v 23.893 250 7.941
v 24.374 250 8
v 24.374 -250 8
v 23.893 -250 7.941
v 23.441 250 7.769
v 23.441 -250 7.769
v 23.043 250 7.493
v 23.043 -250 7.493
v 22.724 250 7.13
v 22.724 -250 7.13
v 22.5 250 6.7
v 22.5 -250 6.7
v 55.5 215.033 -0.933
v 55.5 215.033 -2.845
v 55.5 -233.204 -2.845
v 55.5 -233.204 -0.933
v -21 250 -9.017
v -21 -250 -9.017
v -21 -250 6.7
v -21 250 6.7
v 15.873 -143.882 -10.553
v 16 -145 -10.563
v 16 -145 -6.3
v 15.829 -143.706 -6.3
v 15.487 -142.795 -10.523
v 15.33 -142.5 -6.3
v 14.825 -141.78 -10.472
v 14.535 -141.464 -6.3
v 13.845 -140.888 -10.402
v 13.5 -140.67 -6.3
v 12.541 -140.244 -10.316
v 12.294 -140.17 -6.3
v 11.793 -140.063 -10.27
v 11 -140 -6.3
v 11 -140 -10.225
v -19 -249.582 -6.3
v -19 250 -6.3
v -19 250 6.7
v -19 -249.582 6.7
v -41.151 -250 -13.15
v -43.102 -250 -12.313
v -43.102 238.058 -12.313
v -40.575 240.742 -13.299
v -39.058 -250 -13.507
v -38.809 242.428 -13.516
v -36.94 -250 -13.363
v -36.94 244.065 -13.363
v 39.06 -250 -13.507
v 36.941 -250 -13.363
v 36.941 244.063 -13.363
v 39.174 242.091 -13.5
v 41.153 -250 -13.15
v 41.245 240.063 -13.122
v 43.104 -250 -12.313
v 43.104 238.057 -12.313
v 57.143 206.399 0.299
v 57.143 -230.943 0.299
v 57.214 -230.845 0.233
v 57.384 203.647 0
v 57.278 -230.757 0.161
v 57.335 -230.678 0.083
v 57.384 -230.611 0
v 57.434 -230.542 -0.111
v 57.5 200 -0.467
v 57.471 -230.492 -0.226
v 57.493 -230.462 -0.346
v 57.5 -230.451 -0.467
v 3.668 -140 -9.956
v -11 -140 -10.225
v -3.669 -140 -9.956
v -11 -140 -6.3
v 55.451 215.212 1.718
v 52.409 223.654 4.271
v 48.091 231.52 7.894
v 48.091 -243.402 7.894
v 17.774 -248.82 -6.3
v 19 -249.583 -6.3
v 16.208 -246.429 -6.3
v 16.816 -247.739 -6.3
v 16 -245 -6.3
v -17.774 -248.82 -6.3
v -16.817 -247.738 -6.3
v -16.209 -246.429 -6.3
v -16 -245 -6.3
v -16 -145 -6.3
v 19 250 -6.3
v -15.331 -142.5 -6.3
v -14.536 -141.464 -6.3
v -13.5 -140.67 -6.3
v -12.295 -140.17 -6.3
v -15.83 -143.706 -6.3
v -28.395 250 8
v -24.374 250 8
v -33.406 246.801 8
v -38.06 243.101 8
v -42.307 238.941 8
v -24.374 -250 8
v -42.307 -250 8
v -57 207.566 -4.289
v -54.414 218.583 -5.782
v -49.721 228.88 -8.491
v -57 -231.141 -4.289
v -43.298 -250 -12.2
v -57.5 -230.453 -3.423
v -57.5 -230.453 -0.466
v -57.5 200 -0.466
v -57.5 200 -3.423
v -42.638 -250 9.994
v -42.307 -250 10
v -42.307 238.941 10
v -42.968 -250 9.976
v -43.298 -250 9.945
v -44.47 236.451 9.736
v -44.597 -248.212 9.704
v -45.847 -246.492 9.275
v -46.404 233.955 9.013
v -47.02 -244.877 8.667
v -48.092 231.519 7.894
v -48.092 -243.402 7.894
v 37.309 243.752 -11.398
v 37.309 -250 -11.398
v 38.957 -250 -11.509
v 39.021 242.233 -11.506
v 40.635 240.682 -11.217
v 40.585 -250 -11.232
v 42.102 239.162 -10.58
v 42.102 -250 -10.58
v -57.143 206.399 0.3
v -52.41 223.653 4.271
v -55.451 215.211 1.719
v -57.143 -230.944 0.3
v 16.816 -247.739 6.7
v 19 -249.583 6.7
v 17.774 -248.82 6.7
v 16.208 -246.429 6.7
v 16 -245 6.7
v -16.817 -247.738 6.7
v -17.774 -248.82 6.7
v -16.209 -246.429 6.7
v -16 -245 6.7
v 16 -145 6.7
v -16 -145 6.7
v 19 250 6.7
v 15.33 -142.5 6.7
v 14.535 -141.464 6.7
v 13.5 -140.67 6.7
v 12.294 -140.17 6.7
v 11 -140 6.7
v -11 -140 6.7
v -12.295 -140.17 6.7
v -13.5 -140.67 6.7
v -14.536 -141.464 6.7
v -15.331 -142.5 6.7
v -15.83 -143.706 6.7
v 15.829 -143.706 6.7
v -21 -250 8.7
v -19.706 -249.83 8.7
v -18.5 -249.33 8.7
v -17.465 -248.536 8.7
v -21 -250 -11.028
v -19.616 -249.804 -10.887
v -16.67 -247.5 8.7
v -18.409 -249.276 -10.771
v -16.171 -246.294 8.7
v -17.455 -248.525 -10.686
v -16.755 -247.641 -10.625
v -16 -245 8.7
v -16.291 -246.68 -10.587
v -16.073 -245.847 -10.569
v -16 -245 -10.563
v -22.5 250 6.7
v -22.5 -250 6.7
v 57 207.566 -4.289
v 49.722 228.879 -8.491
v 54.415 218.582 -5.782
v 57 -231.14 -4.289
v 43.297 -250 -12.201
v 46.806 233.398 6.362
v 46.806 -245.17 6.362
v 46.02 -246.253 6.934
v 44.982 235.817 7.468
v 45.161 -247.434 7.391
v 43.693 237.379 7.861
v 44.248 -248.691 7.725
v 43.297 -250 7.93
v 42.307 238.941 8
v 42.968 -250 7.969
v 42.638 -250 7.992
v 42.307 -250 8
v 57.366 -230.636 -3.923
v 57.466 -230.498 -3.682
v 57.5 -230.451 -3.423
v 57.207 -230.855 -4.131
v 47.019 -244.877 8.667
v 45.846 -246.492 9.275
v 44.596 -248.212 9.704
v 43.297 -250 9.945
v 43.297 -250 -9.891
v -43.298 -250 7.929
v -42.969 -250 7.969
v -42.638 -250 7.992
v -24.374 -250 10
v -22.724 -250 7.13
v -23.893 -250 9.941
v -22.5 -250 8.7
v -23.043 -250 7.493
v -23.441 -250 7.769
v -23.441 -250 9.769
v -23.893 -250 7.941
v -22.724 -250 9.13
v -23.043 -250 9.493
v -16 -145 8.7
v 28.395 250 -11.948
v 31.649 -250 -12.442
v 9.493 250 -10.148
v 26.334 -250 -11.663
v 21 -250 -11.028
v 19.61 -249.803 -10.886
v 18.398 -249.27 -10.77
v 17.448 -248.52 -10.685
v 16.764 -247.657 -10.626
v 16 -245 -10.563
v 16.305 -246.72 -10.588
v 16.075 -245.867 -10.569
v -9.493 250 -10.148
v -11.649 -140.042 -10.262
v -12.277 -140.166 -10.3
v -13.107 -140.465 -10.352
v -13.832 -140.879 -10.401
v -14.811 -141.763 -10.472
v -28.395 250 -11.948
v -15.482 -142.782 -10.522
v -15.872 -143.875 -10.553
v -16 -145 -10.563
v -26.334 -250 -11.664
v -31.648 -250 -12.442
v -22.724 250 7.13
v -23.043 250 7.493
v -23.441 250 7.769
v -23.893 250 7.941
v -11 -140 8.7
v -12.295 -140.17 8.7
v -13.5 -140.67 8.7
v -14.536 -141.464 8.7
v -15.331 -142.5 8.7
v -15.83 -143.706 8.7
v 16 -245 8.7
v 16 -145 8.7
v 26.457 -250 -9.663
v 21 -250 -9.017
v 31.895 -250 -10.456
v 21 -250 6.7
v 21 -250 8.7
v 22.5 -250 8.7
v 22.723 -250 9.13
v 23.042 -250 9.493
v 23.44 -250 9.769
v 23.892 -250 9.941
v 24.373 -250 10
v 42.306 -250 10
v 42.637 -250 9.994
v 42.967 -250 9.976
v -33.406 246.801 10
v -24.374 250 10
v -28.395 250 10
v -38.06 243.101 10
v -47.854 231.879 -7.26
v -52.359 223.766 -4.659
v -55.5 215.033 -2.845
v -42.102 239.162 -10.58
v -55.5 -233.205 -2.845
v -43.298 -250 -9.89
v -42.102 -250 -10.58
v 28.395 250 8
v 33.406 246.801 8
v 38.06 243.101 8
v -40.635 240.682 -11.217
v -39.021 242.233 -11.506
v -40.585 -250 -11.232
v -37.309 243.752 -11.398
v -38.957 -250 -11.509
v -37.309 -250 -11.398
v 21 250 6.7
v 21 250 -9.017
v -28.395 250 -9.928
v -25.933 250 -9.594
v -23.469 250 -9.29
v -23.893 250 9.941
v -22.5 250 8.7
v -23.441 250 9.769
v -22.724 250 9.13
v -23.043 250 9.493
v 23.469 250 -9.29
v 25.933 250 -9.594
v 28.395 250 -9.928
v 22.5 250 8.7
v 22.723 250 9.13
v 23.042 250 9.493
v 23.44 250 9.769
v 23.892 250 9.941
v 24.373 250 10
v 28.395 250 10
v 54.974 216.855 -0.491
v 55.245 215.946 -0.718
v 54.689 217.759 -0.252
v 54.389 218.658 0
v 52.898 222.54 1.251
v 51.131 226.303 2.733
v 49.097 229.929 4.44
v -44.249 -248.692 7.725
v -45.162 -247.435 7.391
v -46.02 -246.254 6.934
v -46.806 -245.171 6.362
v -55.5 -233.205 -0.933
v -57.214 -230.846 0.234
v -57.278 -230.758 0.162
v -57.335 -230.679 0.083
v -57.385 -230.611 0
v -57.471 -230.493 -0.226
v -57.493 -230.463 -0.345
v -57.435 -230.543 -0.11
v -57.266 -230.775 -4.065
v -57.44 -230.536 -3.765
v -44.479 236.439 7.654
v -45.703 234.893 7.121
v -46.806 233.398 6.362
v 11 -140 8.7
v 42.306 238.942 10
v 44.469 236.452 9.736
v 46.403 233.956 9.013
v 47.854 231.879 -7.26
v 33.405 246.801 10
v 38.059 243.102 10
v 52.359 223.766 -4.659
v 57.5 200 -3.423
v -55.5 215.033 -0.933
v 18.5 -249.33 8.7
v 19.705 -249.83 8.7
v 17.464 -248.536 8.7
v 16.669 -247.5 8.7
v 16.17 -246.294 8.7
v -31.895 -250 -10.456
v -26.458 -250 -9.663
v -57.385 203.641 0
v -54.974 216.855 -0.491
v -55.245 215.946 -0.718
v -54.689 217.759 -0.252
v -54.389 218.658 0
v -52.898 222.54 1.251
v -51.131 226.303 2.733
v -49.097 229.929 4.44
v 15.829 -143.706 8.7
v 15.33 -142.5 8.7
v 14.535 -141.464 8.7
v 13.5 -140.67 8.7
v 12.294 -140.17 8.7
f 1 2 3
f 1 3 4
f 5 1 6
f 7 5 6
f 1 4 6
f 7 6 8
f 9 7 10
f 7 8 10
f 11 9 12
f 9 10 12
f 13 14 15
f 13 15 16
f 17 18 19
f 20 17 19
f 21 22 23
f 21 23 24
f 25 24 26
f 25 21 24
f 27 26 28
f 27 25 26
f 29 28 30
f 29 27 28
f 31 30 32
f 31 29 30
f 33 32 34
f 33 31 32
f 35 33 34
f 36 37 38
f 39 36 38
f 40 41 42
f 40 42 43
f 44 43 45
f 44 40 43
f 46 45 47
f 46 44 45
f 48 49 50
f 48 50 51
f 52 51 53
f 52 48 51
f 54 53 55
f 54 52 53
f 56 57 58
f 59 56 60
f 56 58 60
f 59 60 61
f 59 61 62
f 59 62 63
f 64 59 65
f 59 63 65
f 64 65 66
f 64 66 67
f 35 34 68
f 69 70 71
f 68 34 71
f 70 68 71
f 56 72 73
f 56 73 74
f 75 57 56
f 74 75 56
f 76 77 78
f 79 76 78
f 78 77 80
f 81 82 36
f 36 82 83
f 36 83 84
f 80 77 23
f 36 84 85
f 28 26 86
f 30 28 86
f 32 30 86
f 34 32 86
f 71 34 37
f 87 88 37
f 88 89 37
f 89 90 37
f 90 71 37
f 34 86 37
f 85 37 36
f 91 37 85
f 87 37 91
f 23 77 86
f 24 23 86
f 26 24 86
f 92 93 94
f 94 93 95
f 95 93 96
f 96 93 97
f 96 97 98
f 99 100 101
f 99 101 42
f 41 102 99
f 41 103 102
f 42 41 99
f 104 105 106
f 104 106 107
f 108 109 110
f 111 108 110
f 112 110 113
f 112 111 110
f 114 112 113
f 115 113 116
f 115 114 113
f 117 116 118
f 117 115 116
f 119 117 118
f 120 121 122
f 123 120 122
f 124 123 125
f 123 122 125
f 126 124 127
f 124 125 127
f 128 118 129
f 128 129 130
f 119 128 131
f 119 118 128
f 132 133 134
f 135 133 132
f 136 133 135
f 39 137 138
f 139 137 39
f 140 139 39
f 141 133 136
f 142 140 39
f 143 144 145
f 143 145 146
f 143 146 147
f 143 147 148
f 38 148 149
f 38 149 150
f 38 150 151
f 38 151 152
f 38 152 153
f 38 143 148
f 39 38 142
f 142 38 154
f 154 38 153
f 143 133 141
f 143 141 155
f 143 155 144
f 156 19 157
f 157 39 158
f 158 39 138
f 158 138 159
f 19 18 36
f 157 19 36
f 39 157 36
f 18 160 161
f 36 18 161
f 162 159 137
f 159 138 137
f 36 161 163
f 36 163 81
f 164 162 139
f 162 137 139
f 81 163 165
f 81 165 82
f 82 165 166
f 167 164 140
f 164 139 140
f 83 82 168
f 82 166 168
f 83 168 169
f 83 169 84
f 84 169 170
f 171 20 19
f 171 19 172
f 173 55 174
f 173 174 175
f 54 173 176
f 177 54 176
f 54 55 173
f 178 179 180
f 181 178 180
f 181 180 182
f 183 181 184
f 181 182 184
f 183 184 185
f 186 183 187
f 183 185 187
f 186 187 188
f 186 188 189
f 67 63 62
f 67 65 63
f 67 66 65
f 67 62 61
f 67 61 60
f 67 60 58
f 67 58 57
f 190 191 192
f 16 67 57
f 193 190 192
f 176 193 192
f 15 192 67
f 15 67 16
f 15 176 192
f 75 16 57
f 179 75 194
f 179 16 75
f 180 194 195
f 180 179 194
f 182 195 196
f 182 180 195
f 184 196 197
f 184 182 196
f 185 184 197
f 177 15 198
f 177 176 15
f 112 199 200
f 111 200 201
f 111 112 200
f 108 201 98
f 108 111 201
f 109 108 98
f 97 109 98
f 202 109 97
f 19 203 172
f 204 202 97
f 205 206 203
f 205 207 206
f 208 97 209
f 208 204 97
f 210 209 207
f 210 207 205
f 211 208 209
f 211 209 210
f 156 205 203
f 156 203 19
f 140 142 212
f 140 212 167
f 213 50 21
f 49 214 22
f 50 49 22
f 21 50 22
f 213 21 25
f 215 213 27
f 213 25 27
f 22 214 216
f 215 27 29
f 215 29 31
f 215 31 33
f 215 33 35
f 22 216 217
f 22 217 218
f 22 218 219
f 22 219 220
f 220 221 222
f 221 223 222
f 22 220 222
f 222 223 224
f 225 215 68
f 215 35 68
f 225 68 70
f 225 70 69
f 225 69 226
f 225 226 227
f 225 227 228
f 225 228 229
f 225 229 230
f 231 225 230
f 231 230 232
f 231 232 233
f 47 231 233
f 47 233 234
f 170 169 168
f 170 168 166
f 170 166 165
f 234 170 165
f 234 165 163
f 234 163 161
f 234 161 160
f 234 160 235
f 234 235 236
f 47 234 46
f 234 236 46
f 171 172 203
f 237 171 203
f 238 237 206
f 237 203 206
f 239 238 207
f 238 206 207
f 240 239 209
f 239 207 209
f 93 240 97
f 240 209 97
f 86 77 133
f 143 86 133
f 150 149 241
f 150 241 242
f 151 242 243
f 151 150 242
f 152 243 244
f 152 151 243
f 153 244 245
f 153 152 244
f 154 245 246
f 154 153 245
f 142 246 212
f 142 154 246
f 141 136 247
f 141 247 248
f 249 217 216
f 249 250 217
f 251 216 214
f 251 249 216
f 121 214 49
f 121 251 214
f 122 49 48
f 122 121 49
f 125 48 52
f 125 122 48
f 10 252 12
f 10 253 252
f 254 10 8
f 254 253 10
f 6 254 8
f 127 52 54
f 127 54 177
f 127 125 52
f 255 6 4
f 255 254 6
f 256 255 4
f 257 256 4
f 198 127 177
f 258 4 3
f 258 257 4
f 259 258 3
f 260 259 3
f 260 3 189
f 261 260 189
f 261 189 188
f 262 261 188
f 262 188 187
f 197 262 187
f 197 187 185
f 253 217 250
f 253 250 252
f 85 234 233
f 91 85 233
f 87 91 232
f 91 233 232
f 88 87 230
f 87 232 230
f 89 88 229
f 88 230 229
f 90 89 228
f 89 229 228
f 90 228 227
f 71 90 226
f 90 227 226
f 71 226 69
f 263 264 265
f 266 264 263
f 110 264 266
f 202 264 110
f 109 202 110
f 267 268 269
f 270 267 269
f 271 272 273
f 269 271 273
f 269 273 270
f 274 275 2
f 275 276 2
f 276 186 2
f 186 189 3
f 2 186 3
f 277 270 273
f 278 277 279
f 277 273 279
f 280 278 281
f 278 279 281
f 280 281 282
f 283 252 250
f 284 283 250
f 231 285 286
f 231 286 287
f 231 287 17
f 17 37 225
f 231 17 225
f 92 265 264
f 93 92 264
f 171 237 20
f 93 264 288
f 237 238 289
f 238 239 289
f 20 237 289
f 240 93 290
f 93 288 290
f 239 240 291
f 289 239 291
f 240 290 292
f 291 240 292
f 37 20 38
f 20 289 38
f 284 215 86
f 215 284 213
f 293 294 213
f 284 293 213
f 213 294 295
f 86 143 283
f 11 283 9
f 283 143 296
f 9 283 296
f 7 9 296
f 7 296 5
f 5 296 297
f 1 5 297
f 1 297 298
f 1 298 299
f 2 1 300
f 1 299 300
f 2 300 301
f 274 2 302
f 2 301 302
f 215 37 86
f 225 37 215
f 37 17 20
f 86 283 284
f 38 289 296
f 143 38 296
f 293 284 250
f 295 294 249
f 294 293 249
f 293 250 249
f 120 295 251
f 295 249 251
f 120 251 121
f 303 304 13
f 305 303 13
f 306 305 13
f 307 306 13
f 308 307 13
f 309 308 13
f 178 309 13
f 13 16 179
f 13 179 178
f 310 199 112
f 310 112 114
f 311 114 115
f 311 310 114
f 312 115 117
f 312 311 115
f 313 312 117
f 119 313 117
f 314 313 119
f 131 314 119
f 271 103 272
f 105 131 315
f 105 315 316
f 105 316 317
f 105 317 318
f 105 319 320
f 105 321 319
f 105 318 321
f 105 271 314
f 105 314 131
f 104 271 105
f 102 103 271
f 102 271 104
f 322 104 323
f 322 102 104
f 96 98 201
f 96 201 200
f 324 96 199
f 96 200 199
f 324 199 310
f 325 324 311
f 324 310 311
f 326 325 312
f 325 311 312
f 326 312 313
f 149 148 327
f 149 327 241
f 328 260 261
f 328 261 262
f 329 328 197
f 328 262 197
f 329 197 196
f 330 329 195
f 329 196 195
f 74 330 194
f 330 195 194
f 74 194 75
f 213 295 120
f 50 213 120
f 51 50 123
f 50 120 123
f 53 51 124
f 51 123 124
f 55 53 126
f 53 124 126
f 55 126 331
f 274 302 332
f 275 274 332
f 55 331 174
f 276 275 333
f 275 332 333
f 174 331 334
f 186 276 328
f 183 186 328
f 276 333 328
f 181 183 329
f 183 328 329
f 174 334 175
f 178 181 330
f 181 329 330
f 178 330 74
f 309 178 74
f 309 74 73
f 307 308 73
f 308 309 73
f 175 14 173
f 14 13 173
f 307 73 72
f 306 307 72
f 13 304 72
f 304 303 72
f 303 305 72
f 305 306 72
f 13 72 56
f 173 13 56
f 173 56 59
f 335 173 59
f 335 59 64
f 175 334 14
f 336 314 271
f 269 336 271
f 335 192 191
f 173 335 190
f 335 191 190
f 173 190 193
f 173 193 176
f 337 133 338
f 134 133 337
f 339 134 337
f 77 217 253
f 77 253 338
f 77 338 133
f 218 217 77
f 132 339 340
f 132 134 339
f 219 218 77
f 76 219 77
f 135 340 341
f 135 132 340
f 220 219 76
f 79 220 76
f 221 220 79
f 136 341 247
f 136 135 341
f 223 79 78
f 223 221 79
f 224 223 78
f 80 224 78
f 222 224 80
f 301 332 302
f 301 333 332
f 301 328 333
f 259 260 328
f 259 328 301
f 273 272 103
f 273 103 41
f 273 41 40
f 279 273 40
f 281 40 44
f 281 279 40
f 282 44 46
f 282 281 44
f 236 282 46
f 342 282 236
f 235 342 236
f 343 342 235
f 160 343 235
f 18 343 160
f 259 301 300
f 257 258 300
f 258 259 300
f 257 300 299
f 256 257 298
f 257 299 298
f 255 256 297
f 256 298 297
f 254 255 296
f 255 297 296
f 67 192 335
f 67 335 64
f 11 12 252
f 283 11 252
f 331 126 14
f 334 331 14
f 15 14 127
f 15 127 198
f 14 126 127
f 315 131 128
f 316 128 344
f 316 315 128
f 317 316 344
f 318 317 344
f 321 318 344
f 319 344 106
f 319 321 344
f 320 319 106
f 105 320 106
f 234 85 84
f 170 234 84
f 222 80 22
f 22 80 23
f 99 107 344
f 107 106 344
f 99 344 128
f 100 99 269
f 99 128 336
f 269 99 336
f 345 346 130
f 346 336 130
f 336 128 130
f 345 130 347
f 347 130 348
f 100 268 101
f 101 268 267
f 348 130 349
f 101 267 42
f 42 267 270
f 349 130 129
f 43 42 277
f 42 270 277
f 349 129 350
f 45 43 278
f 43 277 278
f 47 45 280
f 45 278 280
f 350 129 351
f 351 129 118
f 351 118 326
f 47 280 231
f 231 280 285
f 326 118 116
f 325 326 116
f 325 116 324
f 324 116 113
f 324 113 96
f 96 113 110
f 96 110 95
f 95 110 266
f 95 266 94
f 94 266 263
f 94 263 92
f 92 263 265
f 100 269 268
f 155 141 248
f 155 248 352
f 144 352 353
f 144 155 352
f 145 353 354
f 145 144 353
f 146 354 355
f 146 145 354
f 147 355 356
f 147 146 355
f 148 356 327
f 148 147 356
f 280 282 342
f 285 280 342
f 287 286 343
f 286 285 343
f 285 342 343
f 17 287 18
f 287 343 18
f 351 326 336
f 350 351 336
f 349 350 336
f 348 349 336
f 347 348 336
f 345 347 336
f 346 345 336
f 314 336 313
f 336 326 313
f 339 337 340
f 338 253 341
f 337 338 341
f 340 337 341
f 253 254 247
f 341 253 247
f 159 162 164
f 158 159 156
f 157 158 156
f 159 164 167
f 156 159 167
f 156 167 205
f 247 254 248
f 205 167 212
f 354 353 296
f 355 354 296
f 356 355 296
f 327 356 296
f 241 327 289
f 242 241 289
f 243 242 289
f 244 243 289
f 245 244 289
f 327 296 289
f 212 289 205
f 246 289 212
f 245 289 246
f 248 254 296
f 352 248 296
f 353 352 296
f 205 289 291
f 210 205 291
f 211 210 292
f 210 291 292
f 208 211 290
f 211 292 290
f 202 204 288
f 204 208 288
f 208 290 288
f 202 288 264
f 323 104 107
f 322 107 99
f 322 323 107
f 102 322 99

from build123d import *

# Parameters (mm, degrees)
F2_DEPTH       = 250
F3_W           = 38
F3_H           = 13
F4_DEPTH       = 250
F5_R           = 9
F6_R           = 1
F7_T1_DEPTH    = 509.3674969976
F9_DEPTH       = 500.001
F12_DEPTH      = 13.5192964571
F12_DEPTH_BACK = 10.001
F13_T1_DEPTH   = 2
F13_T6_DEPTH   = 16.7634354909
F13_S7_R       = 200
F13_T8_DEPTH   = 11
F13_T12_DEPTH  = 16.7632527384
F13_S13_R      = 200
F13_T14_DEPTH  = 11
F13_T15_DEPTH  = 29.2634354909
F13_T17_DEPTH  = 27
F13_T19_DEPTH  = 29.2632527384
F14_DEPTH      = 13.5192964571
F14_DEPTH_BACK = 10.001


# Not quite as in the source:
# - a fillet or chamfer that OpenCascade refuses, or shapes differently, is made with other operations: its cross-section is extruded or revolved along the edge and cut away or added


with BuildPart() as f2:
    # F0 (on Front) → F2 (new body, symmetric)
    with BuildSketch(Plane.XZ):
        with BuildLine():
            Line((-22.5004640741, 10), (-45.5824640741, 10))
            Line((-45.5824640741, 10), (-57.5, 0))
            Line((-57.5, 0), (-57.5, -4))
            Line((-57.5, -4), (-40.1794919243, -14))
            ThreePointArc((-40.1794919243, -14), (0.0006744682, -9.9223168214), (40.1808408606, -14))
            Line((40.1808408606, -14), (57.5, -4.0007788087))
            Line((57.5, -4.0007788087), (57.5, -0.0007788087))
            Line((57.5, -0.0007788087), (45.5815359259, 10))
            Line((45.5815359259, 10), (22.4995359259, 10))
            Line((22.4995359259, 10), (22.4995359259, 8.7))
            Line((22.4995359259, 8.7), (-22.5004640741, 8.7))
            Line((-22.5004640741, 8.7), (-22.5004640741, 10))
        make_face()
    extrude(amount=F2_DEPTH, both=True)

    # F3 (on Front) → F4 (cut, symmetric)
    with BuildSketch(Plane.XZ):
        with Locations((0, 0.2)):
            Rectangle(F3_W, F3_H)
    extrude(amount=F4_DEPTH, both=True, mode=Mode.SUBTRACT)

    # F5
    f5_edges = [f2.edges().sort_by_distance(p)[0] for p in [
        (45.581536, 0, 10),
        (40.180841, 0, -14),
        (-45.582464, 0, 10),
        (-40.179492, 0, -14),
    ]]
    fillet(f5_edges, radius=F5_R)

    # F6
    f6_edges = [f2.edges().sort_by_distance(p)[0] for p in [
        (57.5, 0, -0.000779),
        (57.5, 0, -4.000779),
        (-57.5, 0, 0),
        (-57.5, 0, -4),
    ]]
    fillet(f6_edges, radius=F6_R)

    # F7: fillet of radius 2 on 2 edges, made by hand

    # F7_s2 → F7_t1 (cut)
    with BuildSketch(Plane.XZ.offset(-254.6837484988)):
        with BuildLine():
            ThreePointArc((24.3730353255, 10), (23.2328599004, 9.6431676725), (22.4995359259, 8.7))
            Line((22.4995359259, 8.7), (22.4995359259, 10))
            Line((22.4995359259, 10), (24.3730353255, 10))
        make_face()
        with BuildLine():
            ThreePointArc((-22.5004640741, 8.7), (-23.2337880485, 9.6431676725), (-24.3739634736, 10))
            Line((-24.3739634736, 10), (-22.5004640741, 10))
            Line((-22.5004640741, 10), (-22.5004640741, 8.7))
        make_face()
    extrude(amount=F7_T1_DEPTH, mode=Mode.SUBTRACT)

    # F8 (on face) → F9 (cut, through all)
    with BuildSketch(Plane.XZ.offset(250)):
        with BuildLine():
            Line((-21, -9.0169369236), (-21, 6.6999997944))
            Line((-21, 6.6999997944), (-22.5004640741, 6.6999997944))
            ThreePointArc((-22.5004640741, 6.6999997944), (-23.2337879899, 7.6431676078), (-24.3739634736, 8))
            Line((-24.3739634736, 8), (-42.3067319657, 8))
            ThreePointArc((-42.3067319657, 8), (-44.7008729689, 7.5778483455), (-46.8062452335, 6.3623111018))
            Line((-46.8062452335, 6.3623111018), (-55.5, -0.9326153163))
            Line((-55.5, -0.9326153163), (-55.5, -2.8452994616))
            Line((-55.5, -2.8452994616), (-42.102284203, -10.5804742836))
            ThreePointArc((-42.102284203, -10.5804742836), (-39.7790708711, -11.4186713119), (-37.3093621422, -11.3978569477))
            ThreePointArc((-37.3093621422, -11.3978569477), (-29.178975147, -10.0409819041), (-21, -9.0169369236))
        make_face()
        with BuildLine():
            Line((22.5004640741, 6.6999997944), (21, 6.6999997944))
            Line((21, 6.6999997944), (21, -9.0169369236))
            ThreePointArc((21, -9.0169369236), (29.178975147, -10.0409819041), (37.3093621422, -11.3978569477))
            ThreePointArc((37.3093621422, -11.3978569477), (39.7790708711, -11.4186713119), (42.102284203, -10.5804742836))
            Line((42.102284203, -10.5804742836), (55.5, -2.8452994616))
            Line((55.5, -2.8452994616), (55.5, -0.9326153163))
            Line((55.5, -0.9326153163), (46.8062452335, 6.3623111018))
            ThreePointArc((46.8062452335, 6.3623111018), (44.7008729689, 7.5778483455), (42.3067319657, 8))
            Line((42.3067319657, 8), (24.3739634736, 8))
            ThreePointArc((24.3739634736, 8), (23.2337879899, 7.6431676078), (22.5004640741, 6.6999997944))
        make_face()
    extrude(amount=-F9_DEPTH, mode=Mode.SUBTRACT)

    # F11 (on Top) → F12 (cut, two sides)
    with BuildSketch(Plane.XY) as f12_sk:
        Polygon((-68.0004640741, -346), (67.9995359259, -346), (67.9995359259, -216), (43.2970899738, -250), (15.9995359259, -250), (15.9995359259, -140), (-16.0004640741, -140), (-16.0004640741, -250), (-43.2980181219, -250), (-68.0004640741, -216), align=None)
    extrude(amount=-F12_DEPTH, mode=Mode.SUBTRACT)
    extrude(f12_sk.sketch, amount=F12_DEPTH_BACK, mode=Mode.SUBTRACT)

    # F13: fillet of radius 5 on 8 edges, made by hand

    # F13_s2 → F13_t1 (join)
    with BuildSketch(Plane.XY.offset(6.7)):
        with BuildLine():
            ThreePointArc((-11.0004640741, -140), (-14.53599798, -141.4644660941), (-16.0004640741, -145))
            Line((-16.0004640741, -145), (-16.0004640741, -140))
            Line((-16.0004640741, -140), (-11.0004640741, -140))
        make_face()
        with BuildLine():
            ThreePointArc((15.9995359259, -145), (14.5350698319, -141.4644660941), (10.9995359259, -140))
            Line((10.9995359259, -140), (15.9995359259, -140))
            Line((15.9995359259, -140), (15.9995359259, -145))
        make_face()
    extrude(amount=F13_T1_DEPTH)


with BuildPart() as f13_tool4:
    # F13_s5 → F13_t6 (new body)
    with BuildSketch(Plane.XY.offset(-23.0634354909)):
        with BuildLine():
            ThreePointArc((-16.0004640741, -145), (-14.53599798, -141.4644660941), (-11.0004640741, -140))
            Line((-11.0004640741, -140), (-16.0004640741, -140))
            Line((-16.0004640741, -140), (-16.0004640741, -145))
        make_face()
    extrude(amount=F13_T6_DEPTH)

    # F13_s7 → F13_t8 (cut, symmetric)
    with BuildSketch(Plane.XZ.offset(142.5)):
        with Locations((0.0006744682, -209.9223168214)):
            Circle(F13_S7_R)
    extrude(amount=F13_T8_DEPTH, both=True, mode=Mode.SUBTRACT)


with BuildPart() as f2_1:
    add(f2.part)

    # F13_t3: union F13_tool4
    add(f13_tool4.part)


with BuildPart() as f13_tool10:
    # F13_s11 → F13_t12 (new body)
    with BuildSketch(Plane.XY.offset(-23.0632527384)):
        with BuildLine():
            ThreePointArc((15.9995359259, -145), (14.5350698319, -141.4644660941), (10.9995359259, -140))
            Line((10.9995359259, -140), (15.9995359259, -140))
            Line((15.9995359259, -140), (15.9995359259, -145))
        make_face()
    extrude(amount=F13_T12_DEPTH)

    # F13_s13 → F13_t14 (cut, symmetric)
    with BuildSketch(Plane.XZ.offset(142.5)):
        with Locations((0.0006744682, -209.9223168214)):
            Circle(F13_S13_R)
    extrude(amount=F13_T14_DEPTH, both=True, mode=Mode.SUBTRACT)


with BuildPart() as f2_2:
    add(f2_1.part)

    # F13_t9: union F13_tool10
    add(f13_tool10.part)

    # F13_s16 → F13_t15 (cut)
    with BuildSketch(Plane.XY.offset(-23.0634354909)):
        with BuildLine():
            ThreePointArc((-21.0004640741, -250), (-17.4649301681, -248.5355339059), (-16.0004640741, -245))
            Line((-16.0004640741, -245), (-16.0004640741, -250))
            Line((-16.0004640741, -250), (-21.0004640741, -250))
        make_face()
    extrude(amount=F13_T15_DEPTH, mode=Mode.SUBTRACT)

    # F13_s18 → F13_t17 (cut)
    with BuildSketch(Plane.XY.offset(-5.8)):
        with BuildLine():
            ThreePointArc((20.9995359259, -250), (17.46400202, -248.5355339059), (15.9995359259, -245))
            Line((15.9995359259, -245), (15.9995359259, -250))
            Line((15.9995359259, -250), (20.9995359259, -250))
        make_face()
        with BuildLine():
            ThreePointArc((-16.0004640741, -245), (-17.4649301681, -248.5355339059), (-21.0004640741, -250))
            Line((-21.0004640741, -250), (-16.0004640741, -250))
            Line((-16.0004640741, -250), (-16.0004640741, -245))
        make_face()
    extrude(amount=F13_T17_DEPTH, mode=Mode.SUBTRACT)

    # F13_s20 → F13_t19 (cut)
    with BuildSketch(Plane.XY.offset(-23.0632527384)):
        with BuildLine():
            ThreePointArc((20.9995359259, -250), (17.46400202, -248.5355339059), (15.9995359259, -245))
            Line((15.9995359259, -245), (15.9995359259, -250))
            Line((15.9995359259, -250), (20.9995359259, -250))
        make_face()
    extrude(amount=F13_T19_DEPTH, mode=Mode.SUBTRACT)

    # F10 (on Top) → F14 (cut, two sides)
    with BuildSketch(Plane.XY) as f14_sk:
        with BuildLine():
            ThreePointArc((-57.5, 200), (0, 257.5), (57.5, 200))
            Line((57.5, 200), (57.5, 280))
            Line((57.5, 280), (-57.5, 280))
            Line((-57.5, 280), (-57.5, 200))
        make_face()
    extrude(amount=-F14_DEPTH, mode=Mode.SUBTRACT)
    extrude(f14_sk.sketch, amount=F14_DEPTH_BACK, mode=Mode.SUBTRACT)


solid = f2_2.part
